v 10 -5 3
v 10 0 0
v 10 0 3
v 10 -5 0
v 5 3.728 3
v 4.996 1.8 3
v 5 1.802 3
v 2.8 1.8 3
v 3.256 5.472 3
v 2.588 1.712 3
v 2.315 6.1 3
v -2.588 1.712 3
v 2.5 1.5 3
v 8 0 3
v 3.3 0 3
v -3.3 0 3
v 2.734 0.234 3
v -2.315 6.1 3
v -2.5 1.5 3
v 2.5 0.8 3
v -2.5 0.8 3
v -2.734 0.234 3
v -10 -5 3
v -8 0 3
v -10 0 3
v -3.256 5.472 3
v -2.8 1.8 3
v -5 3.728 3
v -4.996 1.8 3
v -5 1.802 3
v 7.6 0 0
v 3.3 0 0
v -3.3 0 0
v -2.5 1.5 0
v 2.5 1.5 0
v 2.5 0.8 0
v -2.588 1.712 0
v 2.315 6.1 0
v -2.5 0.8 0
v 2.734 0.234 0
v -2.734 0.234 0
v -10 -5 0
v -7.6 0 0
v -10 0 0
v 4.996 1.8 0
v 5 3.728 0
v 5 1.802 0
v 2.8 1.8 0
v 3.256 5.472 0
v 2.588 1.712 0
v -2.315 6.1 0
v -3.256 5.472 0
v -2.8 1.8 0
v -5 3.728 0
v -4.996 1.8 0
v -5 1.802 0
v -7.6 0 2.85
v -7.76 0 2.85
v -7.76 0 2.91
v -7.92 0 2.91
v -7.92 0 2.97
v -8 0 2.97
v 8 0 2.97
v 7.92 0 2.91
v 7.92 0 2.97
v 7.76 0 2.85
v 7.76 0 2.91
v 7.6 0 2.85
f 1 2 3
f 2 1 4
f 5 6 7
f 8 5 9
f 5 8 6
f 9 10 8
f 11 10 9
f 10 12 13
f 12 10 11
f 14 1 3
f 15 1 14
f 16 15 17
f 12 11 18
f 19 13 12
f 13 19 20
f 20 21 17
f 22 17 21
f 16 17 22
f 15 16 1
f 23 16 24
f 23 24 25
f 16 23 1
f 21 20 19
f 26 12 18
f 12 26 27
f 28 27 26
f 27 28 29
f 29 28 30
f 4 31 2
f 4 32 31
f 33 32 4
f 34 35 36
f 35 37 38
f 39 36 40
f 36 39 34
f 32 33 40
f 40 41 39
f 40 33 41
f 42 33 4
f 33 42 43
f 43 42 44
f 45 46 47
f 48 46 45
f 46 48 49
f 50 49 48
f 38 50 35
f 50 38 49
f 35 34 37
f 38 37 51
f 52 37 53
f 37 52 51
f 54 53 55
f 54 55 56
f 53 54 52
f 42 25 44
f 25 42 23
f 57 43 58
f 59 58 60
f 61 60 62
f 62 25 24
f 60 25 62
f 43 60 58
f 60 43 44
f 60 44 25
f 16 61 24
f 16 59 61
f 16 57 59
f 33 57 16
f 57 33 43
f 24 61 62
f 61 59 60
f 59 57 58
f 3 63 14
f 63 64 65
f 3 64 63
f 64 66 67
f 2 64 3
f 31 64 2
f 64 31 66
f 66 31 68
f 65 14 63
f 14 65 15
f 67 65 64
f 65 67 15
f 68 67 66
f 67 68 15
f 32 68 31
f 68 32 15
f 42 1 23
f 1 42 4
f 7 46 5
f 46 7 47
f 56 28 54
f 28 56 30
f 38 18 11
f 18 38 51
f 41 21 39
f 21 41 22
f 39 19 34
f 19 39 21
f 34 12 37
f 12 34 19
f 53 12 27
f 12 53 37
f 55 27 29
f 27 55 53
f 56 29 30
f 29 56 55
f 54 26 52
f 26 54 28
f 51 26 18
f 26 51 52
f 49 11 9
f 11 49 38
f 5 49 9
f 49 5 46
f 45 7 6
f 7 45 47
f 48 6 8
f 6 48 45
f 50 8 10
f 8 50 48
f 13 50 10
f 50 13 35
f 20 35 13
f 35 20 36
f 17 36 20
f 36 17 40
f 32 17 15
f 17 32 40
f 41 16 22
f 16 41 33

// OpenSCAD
//Bukoff
module profile(h=50) {
	scale(1.0)linear_extrude(height=h)import("profile.dxf");
}

//Option: FDM Printed Glider
module glider(x=20,y=5,z=3,ex=8.6,b=5) {
	translate([0,0,z/2])cube([x,y,z],center=true);
	translate([0,ex/2,z/2])cube([b,ex,z],center=true);
}

module glider_cut(b) {
	intersection() {
		translate([0,10])profile();
		translate([0,-2.5])glider(b=b);
	}
}
module glider1(b) {
	difference() {
		translate([0,-2.5])glider(b=b);
		glider_cut(b=b);
	}
}

//Option: Laser Cut Glider
module flat() {
	difference(){
		square([20,50],center=true);
		for(i=[-1,1])translate([0,i*22.5])square(5,center=true);
	}
}
module stick_out() {
		square([8,50],center=true);
		for(i=[-1,1])translate([-6.5,i*22.5])square(5,center=true);
}
module cut_glider() {
	flat();
	translate([19.01,0])stick_out();
}

//Render

glider1(b=10);
glider1(b=7);
glider1(b=5);
scale(0.99)glider1(b=5);
scale(0.97)glider1(b=5);
scale(0.95)glider1(b=5);
cut_glider();
